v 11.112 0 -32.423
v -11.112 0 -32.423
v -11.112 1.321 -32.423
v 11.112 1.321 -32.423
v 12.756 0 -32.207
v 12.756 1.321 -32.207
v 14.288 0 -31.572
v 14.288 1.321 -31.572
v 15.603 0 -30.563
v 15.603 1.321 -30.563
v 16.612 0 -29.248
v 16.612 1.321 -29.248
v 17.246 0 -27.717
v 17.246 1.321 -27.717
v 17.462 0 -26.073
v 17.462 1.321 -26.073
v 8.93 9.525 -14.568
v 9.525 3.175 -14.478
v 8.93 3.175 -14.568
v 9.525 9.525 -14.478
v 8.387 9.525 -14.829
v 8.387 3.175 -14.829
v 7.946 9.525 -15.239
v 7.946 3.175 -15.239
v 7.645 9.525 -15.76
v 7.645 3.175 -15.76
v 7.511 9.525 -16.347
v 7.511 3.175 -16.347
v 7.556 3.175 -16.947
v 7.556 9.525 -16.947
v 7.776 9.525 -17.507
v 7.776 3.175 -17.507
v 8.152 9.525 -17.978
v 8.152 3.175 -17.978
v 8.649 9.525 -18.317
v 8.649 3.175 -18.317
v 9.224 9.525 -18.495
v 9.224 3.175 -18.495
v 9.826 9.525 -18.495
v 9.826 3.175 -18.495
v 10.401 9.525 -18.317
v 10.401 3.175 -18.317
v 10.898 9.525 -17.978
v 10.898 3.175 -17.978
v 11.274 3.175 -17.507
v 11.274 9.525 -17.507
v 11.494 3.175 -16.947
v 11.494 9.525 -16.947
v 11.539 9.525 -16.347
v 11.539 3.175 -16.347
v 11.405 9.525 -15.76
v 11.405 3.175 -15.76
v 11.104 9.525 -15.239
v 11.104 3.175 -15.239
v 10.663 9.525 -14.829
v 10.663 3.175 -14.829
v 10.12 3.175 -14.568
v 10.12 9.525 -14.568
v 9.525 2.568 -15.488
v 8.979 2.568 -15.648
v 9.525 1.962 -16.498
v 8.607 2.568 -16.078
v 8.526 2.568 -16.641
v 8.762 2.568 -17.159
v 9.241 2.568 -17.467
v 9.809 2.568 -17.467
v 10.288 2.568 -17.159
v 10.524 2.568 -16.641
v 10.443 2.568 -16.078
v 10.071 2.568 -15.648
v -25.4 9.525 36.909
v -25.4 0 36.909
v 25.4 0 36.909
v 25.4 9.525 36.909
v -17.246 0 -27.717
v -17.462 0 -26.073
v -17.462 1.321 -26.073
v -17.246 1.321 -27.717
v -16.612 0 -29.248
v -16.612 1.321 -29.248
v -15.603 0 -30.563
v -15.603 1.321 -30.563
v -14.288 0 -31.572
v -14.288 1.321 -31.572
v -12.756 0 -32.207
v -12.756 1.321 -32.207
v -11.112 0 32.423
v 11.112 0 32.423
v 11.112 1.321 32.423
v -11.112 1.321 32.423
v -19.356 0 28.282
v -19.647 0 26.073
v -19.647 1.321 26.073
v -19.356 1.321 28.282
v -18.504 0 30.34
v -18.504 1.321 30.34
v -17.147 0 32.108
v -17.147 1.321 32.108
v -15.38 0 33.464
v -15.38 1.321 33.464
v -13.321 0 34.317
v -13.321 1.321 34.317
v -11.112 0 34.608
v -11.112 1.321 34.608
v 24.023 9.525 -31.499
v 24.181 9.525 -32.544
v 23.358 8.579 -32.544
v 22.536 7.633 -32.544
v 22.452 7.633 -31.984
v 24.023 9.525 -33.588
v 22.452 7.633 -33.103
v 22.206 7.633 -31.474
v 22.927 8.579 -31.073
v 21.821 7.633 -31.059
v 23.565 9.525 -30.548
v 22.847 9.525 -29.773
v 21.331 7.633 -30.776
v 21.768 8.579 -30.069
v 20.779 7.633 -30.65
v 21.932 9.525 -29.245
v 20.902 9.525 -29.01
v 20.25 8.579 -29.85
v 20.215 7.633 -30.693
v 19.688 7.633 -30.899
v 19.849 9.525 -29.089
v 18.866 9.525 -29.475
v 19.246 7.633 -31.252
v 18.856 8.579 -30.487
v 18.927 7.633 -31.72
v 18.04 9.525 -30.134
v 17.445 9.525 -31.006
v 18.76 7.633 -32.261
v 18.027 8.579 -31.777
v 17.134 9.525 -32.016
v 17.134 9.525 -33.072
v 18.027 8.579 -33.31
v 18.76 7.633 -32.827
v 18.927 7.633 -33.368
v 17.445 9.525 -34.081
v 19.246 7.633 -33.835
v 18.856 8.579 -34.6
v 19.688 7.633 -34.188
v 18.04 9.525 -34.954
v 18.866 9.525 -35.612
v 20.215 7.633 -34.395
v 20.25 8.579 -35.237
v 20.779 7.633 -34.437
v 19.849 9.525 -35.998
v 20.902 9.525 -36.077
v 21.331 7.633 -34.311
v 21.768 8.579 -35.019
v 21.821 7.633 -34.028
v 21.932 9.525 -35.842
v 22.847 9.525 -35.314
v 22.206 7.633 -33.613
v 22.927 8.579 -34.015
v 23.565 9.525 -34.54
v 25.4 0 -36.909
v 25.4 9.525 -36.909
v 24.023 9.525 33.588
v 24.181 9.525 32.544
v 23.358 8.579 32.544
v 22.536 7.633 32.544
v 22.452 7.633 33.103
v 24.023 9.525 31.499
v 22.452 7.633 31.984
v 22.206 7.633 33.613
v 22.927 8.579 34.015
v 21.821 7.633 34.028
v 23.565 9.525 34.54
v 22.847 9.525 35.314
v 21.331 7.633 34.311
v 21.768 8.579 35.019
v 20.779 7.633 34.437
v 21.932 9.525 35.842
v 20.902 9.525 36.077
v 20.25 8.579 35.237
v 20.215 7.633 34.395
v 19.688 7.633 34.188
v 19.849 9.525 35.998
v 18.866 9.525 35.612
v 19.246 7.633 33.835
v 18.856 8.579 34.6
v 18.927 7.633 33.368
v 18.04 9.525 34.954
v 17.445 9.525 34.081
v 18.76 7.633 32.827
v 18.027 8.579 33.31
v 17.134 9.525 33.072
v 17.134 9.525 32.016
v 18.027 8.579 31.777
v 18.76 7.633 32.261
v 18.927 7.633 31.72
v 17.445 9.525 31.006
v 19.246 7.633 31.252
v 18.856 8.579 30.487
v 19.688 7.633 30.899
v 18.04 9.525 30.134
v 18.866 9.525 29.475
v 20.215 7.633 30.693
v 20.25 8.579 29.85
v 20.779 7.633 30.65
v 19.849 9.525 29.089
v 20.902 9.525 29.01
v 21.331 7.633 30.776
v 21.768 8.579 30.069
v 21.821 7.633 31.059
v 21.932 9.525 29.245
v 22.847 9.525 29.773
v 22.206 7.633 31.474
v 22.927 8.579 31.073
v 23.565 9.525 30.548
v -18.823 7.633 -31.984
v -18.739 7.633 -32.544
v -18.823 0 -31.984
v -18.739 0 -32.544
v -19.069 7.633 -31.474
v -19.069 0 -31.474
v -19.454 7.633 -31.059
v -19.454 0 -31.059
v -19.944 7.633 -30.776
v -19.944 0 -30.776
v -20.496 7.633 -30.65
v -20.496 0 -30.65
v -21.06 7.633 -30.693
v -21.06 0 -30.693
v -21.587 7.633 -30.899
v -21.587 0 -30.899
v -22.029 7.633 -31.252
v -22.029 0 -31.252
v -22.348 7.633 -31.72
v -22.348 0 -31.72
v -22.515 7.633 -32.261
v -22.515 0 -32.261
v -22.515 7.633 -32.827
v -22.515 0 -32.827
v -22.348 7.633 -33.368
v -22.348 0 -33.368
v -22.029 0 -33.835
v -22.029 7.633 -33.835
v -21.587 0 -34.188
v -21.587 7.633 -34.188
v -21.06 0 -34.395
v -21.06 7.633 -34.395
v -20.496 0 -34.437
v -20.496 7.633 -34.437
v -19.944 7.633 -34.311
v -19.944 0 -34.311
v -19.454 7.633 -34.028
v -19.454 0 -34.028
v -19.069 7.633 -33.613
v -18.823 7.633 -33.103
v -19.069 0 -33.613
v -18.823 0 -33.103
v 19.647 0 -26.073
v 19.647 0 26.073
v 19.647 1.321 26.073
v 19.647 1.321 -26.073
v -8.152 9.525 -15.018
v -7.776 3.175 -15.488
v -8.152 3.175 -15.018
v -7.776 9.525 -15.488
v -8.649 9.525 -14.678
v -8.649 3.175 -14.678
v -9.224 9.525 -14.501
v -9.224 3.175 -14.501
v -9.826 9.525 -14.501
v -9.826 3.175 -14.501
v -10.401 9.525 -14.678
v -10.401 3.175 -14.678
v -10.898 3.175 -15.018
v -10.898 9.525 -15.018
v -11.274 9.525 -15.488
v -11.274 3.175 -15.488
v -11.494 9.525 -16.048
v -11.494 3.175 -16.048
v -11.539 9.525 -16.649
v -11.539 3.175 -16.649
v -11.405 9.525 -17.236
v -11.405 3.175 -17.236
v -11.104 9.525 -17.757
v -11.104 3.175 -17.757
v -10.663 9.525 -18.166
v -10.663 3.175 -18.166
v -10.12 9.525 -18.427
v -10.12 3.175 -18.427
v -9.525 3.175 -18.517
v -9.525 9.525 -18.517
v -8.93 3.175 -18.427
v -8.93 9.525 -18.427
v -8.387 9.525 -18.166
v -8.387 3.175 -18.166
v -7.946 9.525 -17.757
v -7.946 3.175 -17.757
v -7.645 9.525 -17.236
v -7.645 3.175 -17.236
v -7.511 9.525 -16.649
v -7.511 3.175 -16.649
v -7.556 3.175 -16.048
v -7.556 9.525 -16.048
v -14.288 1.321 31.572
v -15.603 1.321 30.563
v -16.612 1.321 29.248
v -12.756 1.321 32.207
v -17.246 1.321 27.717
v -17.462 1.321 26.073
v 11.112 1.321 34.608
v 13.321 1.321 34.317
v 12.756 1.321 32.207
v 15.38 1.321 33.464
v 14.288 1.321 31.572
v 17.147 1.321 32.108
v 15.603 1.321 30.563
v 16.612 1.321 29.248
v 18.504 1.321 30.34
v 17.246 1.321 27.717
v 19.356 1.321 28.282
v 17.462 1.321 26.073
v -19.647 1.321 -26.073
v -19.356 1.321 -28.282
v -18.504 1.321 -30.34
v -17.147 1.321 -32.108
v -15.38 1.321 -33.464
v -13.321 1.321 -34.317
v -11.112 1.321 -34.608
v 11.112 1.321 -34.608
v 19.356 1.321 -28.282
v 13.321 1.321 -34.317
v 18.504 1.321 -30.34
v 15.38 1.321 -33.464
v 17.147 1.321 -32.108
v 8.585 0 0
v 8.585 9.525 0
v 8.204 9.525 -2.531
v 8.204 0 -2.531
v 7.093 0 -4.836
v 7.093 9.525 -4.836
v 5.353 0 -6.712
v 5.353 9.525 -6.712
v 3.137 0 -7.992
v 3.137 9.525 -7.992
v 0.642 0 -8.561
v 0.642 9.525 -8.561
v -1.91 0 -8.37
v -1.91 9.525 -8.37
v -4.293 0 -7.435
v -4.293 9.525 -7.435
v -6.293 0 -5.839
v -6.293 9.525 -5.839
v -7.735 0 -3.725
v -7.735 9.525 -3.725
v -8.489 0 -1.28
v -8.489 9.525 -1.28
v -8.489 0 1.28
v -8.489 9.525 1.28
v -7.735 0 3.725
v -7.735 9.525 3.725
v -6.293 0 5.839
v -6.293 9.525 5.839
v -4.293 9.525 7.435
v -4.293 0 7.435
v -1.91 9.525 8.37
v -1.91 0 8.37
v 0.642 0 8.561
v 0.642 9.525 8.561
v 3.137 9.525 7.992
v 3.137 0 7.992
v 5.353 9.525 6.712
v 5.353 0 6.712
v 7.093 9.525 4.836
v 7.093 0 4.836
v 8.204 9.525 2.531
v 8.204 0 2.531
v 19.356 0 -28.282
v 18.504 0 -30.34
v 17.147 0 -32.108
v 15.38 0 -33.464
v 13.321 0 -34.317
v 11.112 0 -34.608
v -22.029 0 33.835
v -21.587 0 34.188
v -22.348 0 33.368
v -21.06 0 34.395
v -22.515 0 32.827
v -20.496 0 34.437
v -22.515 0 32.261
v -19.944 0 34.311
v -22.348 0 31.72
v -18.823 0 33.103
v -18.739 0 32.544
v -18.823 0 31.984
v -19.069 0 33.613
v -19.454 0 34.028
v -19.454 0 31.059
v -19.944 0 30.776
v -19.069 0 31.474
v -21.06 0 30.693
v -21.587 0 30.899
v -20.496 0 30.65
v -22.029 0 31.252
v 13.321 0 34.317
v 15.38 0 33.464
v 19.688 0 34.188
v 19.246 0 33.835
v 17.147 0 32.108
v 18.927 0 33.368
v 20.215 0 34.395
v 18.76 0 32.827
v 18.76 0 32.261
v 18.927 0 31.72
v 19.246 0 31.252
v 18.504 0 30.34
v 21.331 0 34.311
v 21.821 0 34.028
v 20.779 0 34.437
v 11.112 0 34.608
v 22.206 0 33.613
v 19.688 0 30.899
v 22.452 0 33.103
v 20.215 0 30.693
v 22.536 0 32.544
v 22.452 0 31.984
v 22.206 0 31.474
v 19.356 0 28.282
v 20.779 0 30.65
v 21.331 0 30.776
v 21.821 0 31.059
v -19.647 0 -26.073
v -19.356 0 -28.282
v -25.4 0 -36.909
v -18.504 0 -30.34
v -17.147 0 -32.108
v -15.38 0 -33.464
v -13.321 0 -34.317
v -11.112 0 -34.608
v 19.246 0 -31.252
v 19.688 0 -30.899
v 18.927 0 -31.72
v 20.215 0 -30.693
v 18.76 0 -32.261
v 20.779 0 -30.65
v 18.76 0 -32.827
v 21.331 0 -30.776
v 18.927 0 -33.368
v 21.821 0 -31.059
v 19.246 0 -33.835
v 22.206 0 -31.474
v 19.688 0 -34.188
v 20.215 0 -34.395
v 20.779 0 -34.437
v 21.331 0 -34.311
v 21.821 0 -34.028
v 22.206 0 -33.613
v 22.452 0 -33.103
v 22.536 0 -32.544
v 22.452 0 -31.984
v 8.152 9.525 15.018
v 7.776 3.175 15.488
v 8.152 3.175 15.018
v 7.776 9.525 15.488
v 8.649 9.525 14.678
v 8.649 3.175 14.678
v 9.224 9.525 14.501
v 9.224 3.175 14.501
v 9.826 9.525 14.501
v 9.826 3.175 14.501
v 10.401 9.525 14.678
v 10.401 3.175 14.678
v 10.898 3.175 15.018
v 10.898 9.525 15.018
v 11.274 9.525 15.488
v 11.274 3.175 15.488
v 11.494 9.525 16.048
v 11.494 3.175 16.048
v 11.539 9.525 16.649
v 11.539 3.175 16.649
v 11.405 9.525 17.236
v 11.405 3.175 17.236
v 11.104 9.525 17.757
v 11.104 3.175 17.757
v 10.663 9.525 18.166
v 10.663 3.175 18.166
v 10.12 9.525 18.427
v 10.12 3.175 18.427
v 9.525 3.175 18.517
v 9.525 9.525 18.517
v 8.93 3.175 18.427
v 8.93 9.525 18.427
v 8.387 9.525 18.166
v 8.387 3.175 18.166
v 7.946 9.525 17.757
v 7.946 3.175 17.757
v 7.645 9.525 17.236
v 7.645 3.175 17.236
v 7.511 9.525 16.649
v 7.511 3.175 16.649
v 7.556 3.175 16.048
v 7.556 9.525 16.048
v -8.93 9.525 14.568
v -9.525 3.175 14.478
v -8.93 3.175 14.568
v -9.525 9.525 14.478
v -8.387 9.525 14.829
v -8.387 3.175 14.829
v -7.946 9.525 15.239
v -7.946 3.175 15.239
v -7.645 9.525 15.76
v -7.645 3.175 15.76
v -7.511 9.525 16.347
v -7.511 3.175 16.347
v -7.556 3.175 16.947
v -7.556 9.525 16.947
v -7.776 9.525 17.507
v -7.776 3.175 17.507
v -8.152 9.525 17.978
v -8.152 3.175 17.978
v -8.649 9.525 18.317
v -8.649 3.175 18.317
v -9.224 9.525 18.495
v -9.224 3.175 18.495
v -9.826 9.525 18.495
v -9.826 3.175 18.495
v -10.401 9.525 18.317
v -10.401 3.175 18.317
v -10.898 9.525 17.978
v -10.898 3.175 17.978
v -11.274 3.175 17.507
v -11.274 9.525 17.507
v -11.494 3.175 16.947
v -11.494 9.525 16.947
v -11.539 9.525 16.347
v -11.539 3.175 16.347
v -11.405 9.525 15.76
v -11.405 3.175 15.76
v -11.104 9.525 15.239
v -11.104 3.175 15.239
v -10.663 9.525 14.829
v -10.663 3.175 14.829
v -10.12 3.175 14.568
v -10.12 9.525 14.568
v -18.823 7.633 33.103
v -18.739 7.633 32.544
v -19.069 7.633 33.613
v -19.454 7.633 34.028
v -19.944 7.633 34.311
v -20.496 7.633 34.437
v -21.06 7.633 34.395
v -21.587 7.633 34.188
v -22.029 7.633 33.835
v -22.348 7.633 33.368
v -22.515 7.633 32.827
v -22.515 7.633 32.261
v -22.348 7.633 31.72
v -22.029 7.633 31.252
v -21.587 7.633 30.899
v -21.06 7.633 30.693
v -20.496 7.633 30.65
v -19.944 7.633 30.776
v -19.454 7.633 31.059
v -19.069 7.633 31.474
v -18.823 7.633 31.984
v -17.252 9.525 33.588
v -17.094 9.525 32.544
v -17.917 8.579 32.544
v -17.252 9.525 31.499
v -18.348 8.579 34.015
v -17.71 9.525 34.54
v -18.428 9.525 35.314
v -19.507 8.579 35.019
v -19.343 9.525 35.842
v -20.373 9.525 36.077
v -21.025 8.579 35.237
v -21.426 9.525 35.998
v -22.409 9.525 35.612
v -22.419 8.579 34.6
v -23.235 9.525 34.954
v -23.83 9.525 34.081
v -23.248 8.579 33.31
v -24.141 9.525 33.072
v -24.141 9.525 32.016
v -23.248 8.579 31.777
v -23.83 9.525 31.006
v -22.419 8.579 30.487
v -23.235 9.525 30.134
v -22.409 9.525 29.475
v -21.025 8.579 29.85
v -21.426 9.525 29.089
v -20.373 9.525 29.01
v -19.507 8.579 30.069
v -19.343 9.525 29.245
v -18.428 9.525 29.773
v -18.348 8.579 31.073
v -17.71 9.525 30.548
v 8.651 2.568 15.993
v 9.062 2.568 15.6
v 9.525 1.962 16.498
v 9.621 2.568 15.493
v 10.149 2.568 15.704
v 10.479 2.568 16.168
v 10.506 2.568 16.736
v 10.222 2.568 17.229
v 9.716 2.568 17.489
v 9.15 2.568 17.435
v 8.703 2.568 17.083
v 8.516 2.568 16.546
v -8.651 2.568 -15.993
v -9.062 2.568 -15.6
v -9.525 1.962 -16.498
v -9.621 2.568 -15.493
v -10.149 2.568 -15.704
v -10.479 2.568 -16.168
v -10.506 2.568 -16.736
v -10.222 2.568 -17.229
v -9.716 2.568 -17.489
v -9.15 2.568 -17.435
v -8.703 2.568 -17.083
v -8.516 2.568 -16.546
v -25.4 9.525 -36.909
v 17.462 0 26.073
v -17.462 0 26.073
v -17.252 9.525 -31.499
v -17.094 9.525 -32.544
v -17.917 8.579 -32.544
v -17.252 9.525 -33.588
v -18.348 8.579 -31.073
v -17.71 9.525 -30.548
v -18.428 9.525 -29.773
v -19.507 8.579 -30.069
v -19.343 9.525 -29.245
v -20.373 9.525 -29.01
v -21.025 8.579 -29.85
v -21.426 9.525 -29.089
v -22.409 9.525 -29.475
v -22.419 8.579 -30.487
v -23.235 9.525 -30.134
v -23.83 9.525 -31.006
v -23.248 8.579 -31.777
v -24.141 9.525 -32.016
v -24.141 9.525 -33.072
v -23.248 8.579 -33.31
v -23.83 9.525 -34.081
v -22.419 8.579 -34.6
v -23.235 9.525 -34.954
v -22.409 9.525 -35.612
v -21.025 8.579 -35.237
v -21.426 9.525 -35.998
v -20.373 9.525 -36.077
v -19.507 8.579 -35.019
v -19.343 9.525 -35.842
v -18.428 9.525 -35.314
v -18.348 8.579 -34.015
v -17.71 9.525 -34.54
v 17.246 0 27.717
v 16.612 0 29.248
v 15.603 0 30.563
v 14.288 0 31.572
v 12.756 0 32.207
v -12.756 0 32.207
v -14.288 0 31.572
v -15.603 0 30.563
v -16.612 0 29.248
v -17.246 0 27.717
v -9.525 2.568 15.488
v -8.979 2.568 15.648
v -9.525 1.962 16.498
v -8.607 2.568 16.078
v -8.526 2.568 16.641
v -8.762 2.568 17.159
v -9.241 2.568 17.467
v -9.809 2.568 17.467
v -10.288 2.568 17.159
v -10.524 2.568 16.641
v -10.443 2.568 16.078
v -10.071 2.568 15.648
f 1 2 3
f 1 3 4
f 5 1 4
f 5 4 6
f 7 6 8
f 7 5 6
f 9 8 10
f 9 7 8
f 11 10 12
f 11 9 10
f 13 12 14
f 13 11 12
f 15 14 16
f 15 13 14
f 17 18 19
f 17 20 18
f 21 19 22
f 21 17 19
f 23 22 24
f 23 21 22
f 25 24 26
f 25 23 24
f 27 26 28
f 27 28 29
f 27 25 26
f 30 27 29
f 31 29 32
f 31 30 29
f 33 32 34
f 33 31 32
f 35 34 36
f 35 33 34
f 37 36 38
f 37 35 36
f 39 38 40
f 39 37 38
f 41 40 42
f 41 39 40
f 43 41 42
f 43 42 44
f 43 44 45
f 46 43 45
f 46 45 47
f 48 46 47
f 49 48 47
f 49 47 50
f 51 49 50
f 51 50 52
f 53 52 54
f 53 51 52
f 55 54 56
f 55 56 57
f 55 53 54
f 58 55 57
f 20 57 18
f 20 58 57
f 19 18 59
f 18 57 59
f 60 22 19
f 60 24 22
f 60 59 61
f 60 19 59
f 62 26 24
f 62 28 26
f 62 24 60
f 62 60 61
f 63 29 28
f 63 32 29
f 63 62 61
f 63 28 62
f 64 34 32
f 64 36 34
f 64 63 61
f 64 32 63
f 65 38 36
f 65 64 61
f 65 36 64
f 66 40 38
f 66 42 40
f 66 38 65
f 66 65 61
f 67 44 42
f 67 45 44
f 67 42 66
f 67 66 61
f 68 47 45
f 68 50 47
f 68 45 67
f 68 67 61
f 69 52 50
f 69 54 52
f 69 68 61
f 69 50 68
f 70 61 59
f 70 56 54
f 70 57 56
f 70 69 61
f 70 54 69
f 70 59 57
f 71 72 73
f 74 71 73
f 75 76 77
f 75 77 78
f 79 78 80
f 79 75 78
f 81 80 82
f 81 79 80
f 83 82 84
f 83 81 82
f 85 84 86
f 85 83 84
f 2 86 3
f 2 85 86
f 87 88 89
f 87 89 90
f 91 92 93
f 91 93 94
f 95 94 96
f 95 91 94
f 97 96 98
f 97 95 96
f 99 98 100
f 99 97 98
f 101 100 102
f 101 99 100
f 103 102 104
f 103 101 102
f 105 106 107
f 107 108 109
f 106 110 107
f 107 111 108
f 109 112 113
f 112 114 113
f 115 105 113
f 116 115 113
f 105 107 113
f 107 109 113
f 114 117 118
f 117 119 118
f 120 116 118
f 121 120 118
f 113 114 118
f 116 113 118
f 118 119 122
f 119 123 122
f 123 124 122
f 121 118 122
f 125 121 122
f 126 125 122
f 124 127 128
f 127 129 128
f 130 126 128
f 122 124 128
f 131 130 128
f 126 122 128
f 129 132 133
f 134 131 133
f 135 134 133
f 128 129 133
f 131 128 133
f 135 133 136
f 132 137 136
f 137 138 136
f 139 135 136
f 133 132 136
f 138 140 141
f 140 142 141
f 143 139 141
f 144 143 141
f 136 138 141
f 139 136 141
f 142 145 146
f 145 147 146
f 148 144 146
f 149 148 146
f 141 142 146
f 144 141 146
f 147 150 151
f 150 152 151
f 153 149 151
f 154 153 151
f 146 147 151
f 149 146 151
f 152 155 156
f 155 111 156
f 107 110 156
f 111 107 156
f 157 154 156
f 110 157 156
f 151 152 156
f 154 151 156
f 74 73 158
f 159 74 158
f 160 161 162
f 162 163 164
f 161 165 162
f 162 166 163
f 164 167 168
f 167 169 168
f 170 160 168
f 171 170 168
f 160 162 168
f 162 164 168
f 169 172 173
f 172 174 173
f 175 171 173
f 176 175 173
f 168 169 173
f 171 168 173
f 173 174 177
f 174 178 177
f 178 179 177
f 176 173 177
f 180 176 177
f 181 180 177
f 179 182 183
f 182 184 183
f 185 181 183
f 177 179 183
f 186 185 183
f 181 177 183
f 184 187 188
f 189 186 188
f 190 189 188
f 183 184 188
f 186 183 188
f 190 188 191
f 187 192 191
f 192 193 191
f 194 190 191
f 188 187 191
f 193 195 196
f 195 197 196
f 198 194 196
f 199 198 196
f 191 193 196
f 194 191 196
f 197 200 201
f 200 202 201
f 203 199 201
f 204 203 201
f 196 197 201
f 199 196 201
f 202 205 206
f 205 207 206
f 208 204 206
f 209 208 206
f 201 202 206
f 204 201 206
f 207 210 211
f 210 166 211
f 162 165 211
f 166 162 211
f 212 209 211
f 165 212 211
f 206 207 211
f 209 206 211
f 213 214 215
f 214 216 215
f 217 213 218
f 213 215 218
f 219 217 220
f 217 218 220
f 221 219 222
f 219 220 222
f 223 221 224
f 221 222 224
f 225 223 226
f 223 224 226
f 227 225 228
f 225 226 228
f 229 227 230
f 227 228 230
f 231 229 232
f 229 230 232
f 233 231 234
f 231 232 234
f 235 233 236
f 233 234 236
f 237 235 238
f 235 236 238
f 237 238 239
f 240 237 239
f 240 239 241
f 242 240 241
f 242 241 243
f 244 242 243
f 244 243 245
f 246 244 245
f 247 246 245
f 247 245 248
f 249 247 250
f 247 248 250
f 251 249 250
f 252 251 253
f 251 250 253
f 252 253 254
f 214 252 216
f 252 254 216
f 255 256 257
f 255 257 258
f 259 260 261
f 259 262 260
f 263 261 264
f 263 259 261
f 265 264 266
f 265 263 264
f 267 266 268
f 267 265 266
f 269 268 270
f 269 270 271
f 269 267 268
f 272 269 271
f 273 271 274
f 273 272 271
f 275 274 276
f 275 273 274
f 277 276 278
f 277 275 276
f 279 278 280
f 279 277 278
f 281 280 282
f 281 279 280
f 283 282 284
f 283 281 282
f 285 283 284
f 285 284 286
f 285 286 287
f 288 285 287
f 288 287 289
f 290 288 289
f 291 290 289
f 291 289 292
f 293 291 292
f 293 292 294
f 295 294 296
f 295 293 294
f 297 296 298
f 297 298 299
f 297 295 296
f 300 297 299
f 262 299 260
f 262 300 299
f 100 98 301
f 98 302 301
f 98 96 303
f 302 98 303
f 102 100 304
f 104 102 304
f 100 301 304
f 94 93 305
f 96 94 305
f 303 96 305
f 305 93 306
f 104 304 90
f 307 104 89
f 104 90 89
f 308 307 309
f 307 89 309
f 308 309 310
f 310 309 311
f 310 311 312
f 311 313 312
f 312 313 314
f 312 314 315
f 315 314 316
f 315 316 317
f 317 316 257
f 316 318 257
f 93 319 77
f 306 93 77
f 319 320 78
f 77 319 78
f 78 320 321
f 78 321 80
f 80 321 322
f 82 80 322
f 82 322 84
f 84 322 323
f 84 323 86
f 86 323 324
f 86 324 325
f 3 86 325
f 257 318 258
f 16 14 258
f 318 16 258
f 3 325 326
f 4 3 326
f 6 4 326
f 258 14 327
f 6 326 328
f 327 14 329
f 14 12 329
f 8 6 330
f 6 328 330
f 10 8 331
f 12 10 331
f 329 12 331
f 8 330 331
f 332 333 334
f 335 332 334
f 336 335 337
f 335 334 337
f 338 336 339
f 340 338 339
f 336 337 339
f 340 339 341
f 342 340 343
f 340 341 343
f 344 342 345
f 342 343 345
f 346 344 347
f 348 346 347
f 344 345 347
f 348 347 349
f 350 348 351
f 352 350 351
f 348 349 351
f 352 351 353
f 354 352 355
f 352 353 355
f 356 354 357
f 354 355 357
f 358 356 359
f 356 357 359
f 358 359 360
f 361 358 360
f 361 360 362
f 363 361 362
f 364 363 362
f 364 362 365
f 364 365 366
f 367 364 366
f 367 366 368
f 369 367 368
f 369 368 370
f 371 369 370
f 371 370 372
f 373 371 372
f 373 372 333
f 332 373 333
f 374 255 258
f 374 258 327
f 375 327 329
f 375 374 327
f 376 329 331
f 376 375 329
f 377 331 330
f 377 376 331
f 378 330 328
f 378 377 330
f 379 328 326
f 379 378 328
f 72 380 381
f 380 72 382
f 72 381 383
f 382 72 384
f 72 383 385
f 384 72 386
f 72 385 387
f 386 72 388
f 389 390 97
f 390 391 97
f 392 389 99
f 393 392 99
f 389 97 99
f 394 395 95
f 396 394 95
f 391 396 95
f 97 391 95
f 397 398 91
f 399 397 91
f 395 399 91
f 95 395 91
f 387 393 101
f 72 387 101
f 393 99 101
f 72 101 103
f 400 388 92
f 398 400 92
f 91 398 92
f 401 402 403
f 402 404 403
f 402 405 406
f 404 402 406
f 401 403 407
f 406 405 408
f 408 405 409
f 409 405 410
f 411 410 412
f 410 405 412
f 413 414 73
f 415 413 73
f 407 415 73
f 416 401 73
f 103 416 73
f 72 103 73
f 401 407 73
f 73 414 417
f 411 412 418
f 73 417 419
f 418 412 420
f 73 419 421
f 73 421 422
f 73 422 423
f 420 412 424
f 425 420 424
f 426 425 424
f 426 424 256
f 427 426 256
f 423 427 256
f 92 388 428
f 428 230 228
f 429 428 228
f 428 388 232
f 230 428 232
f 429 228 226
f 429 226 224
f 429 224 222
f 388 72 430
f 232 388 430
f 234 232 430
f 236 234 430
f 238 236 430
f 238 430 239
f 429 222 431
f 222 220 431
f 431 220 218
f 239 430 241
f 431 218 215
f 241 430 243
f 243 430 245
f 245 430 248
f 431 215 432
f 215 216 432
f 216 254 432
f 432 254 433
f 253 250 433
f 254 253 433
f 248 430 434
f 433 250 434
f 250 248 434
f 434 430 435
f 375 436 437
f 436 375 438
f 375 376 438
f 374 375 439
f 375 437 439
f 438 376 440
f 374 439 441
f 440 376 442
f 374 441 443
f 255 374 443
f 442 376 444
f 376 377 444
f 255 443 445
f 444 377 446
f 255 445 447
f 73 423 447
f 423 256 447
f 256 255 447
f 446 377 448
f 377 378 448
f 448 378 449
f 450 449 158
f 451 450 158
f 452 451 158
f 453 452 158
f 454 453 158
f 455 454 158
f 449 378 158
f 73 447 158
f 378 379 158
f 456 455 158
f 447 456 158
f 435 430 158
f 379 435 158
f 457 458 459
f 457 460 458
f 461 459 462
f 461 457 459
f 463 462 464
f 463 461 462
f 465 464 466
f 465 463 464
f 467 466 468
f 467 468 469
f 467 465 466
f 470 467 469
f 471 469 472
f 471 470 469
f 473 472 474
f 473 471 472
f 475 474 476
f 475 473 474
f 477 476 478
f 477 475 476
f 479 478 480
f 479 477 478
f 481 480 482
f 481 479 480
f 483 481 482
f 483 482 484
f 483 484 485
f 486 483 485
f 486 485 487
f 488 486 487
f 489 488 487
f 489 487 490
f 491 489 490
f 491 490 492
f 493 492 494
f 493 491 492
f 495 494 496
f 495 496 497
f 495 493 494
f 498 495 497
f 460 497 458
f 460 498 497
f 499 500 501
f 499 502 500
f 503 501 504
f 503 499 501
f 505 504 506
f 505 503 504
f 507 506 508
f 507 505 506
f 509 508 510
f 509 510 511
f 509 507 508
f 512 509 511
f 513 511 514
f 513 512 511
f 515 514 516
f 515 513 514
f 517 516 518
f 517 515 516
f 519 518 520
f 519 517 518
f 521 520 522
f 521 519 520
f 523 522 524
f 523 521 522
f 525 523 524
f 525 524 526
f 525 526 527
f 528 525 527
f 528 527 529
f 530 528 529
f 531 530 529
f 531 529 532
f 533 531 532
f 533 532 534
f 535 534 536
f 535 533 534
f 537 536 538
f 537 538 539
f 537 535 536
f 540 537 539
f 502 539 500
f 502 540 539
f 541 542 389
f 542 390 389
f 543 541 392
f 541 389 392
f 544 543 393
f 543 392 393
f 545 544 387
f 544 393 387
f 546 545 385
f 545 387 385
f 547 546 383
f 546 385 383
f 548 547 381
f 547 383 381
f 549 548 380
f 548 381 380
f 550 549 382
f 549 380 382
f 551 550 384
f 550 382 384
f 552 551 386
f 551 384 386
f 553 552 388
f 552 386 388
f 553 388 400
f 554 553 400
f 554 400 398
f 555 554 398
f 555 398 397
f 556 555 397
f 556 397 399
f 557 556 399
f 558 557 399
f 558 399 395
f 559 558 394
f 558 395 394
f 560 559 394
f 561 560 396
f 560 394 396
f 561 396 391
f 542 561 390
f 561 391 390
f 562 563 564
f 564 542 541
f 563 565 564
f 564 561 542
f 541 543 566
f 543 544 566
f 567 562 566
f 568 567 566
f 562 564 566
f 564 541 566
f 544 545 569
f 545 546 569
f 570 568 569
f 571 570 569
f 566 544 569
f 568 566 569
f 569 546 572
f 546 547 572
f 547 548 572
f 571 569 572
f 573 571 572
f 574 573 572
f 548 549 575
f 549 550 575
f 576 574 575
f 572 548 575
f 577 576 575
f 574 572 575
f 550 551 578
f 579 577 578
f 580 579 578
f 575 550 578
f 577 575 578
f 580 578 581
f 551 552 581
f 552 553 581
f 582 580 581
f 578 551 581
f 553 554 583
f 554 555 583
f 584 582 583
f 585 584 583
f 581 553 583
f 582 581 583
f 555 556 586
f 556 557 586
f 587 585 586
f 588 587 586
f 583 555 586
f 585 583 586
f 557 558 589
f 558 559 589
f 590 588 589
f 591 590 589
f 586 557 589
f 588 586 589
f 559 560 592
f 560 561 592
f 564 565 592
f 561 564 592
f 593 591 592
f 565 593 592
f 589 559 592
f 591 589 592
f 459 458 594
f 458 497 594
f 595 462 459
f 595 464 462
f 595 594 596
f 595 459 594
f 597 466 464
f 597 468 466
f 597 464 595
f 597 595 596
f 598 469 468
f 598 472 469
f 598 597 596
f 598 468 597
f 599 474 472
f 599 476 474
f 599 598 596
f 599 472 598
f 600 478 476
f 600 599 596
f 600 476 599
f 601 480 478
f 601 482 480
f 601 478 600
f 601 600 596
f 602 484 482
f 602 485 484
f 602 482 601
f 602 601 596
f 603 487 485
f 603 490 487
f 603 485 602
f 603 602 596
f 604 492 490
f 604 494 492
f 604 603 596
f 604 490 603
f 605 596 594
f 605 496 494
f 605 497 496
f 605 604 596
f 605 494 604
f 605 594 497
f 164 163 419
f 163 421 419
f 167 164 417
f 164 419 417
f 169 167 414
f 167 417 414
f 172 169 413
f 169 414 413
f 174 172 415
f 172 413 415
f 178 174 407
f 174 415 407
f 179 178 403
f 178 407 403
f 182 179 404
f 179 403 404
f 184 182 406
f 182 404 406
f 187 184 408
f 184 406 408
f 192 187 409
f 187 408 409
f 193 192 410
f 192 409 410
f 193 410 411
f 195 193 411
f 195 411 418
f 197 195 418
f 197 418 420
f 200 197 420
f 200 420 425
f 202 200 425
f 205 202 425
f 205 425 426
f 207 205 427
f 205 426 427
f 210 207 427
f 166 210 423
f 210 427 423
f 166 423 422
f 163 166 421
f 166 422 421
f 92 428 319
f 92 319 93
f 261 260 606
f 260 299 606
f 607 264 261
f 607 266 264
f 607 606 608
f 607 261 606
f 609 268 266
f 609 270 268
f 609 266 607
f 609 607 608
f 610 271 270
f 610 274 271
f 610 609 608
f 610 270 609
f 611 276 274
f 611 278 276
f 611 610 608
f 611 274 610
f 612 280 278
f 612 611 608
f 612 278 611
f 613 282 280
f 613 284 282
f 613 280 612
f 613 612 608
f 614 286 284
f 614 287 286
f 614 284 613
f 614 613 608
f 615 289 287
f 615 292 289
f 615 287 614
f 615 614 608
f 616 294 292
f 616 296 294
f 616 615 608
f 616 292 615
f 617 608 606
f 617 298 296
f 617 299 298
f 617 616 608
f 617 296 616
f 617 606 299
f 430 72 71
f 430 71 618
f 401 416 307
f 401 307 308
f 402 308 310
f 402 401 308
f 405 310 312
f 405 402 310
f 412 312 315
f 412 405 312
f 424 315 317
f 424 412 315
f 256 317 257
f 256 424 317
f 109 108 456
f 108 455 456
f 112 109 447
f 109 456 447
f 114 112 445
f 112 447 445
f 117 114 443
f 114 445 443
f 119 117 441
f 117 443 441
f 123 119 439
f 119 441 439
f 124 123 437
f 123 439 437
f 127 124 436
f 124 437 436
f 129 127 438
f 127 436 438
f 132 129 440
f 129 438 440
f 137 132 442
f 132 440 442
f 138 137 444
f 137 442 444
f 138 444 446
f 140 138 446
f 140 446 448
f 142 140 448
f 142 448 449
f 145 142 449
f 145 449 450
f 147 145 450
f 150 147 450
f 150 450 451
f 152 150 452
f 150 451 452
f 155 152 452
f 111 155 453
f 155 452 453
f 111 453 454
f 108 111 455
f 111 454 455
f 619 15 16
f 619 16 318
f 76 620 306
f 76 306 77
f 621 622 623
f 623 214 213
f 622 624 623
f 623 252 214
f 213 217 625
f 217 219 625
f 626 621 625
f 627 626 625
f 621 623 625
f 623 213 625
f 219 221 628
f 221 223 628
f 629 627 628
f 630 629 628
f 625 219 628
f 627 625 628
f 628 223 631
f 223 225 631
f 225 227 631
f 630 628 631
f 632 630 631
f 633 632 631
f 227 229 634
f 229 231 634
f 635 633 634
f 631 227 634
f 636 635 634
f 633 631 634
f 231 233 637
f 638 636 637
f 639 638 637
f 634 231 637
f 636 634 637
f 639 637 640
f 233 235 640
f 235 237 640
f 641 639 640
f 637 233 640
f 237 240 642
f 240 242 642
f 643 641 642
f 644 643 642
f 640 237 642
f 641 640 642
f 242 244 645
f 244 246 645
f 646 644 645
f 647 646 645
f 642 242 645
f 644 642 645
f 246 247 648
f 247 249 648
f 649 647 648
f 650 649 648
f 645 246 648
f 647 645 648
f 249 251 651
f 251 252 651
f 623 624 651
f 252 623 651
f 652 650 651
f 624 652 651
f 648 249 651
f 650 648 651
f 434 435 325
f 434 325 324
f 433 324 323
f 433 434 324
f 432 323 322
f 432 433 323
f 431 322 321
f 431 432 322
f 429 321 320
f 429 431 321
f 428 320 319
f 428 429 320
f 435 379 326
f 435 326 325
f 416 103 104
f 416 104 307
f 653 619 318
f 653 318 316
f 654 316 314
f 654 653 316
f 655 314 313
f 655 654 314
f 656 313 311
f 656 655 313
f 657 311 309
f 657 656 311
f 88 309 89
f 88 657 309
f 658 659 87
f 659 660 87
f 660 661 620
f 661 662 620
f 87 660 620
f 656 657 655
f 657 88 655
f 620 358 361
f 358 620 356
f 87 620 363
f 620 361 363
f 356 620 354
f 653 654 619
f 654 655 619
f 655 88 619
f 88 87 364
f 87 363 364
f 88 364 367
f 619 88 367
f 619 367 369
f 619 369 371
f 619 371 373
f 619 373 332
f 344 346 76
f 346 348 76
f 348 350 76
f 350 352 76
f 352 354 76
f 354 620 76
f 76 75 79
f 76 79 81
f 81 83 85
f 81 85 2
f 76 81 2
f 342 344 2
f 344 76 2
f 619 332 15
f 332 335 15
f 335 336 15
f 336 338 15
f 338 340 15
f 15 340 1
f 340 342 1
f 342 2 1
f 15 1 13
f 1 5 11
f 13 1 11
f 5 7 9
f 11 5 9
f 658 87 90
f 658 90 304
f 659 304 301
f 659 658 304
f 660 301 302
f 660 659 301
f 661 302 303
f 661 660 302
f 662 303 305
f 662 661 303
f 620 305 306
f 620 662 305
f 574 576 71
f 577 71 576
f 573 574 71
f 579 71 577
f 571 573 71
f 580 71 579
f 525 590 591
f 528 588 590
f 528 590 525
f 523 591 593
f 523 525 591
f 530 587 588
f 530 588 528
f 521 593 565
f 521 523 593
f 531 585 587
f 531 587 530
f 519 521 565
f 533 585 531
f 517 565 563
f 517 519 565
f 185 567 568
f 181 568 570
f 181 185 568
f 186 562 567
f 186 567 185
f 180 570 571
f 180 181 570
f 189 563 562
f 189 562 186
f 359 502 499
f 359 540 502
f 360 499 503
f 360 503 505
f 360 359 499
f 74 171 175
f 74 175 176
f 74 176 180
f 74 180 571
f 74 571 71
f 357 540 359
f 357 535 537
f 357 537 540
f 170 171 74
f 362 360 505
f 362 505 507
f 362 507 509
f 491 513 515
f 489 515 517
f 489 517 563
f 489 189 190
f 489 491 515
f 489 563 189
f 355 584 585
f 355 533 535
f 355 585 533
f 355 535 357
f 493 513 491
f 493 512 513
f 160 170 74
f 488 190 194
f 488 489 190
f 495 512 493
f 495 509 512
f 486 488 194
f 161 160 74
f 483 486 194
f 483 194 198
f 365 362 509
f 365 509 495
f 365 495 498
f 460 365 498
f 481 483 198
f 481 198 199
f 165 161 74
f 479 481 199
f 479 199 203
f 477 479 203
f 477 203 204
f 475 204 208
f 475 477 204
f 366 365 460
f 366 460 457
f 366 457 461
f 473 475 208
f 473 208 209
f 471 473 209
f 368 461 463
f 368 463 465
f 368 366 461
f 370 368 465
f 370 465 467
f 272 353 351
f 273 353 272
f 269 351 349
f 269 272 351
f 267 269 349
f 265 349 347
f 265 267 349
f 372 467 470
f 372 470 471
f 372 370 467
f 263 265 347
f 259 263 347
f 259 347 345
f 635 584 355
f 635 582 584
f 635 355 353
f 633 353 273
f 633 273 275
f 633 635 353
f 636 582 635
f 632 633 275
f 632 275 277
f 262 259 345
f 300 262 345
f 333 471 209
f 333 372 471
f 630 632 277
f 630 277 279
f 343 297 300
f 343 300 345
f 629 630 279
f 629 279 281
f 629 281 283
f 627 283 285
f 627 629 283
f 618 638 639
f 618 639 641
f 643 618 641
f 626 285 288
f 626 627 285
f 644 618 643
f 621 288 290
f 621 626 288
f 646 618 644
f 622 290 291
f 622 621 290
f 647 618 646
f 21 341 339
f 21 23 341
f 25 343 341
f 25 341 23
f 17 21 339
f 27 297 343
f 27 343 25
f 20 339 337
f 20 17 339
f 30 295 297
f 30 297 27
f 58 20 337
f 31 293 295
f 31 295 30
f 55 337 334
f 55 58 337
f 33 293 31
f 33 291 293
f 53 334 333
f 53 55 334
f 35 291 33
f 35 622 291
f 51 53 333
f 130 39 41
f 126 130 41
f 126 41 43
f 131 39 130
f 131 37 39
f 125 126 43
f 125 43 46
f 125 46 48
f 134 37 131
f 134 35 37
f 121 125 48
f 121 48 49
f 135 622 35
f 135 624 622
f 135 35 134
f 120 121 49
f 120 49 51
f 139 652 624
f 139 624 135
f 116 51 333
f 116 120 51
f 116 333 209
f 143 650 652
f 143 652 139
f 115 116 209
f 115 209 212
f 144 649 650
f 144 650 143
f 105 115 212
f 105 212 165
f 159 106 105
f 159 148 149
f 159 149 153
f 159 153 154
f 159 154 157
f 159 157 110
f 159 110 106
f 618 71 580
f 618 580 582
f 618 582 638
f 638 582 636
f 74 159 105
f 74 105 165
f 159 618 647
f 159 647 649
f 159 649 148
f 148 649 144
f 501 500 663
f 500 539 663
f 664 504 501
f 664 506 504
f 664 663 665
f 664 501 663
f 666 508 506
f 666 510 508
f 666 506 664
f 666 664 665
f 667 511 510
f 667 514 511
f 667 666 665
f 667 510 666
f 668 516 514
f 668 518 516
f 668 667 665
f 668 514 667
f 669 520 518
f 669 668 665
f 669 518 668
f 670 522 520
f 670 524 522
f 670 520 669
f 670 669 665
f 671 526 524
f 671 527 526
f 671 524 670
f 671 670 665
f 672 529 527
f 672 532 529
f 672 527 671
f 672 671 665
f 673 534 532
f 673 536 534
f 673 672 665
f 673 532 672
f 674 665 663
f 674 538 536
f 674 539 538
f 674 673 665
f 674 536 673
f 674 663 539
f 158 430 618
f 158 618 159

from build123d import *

# Parameters (mm, degrees)
SKETCH1_W                                      = 50.8
SKETCH1_H                                      = 73.81875
BOSS_EXTRUDE1_DEPTH                            = 9.525
CSK_FOR_6_FLAT_HEAD_MACHINE_SCREW1_D           = 3.7973
CSK_FOR_6_FLAT_HEAD_MACHINE_SCREW1_CSINK_D     = 7.0866
CSK_FOR_6_FLAT_HEAD_MACHINE_SCREW1_CSINK_ANGLE = 82
CUT_EXTRUDE1_DASH_036_DEPTH                    = 1.3208
SKETCH5_R                                      = 8.5852
CUT_EXTRUDE1_DEPTH                             = 10.525
CIRPATTERN1_COUNT                              = 6


with BuildPart() as part:
    # Sketch1 → Boss-Extrude1 (new body)
    with BuildSketch(Plane(origin=(0, 0, 0), x_dir=(1, 0, 0), z_dir=(0, 1, 0))):
        Rectangle(SKETCH1_W, SKETCH1_H)
    extrude(amount=BOSS_EXTRUDE1_DEPTH)

    # CSK for #6 Flat Head Machine Screw1 (through all)
    with Locations(Plane(origin=(0, 9.525, 0), x_dir=(-1, 0, 0), z_dir=(0, 1, 0))):
        with Locations((20.6375, -32.54375), (-20.6375, -32.54375), (-20.6375, 32.54375), (20.6375, 32.54375)):
            CounterSinkHole(CSK_FOR_6_FLAT_HEAD_MACHINE_SCREW1_D / 2, CSK_FOR_6_FLAT_HEAD_MACHINE_SCREW1_CSINK_D / 2, counter_sink_angle=CSK_FOR_6_FLAT_HEAD_MACHINE_SCREW1_CSINK_ANGLE)

    # Sketch4 → Cut-Extrude1 - dash 036 (cut)
    with BuildSketch(Plane(origin=(0, 0, 0), x_dir=(-1, 0, 0), z_dir=(0, -1, 0))):
        with BuildLine():
            Line((-11.1125, 34.6075), (11.1125, 34.6075))
            ThreePointArc((11.1125, 34.6075), (17.147232113, 32.107832113), (19.6469, 26.0731))
            Line((19.6469, 26.0731), (19.6469, -26.0731))
            ThreePointArc((19.6469, -26.0731), (17.147232113, -32.107832113), (11.1125, -34.6075))
            Line((11.1125, -34.6075), (-11.1125, -34.6075))
            ThreePointArc((-11.1125, -34.6075), (-17.147232113, -32.107832113), (-19.6469, -26.0731))
            Line((-19.6469, -26.0731), (-19.6469, 26.0731))
            ThreePointArc((-19.6469, 26.0731), (-17.147232113, 32.107832113), (-11.1125, 34.6075))
        make_face()
        with BuildLine():
            Line((-11.1125, -32.4231), (11.1125, -32.4231))
            ThreePointArc((11.1125, -32.4231), (15.602628061, -30.563228061), (17.4625, -26.0731))
            Line((17.4625, -26.0731), (17.4625, 26.0731))
            ThreePointArc((17.4625, 26.0731), (15.602628061, 30.563228061), (11.1125, 32.4231))
            Line((11.1125, 32.4231), (-11.1125, 32.4231))
            ThreePointArc((-11.1125, 32.4231), (-15.602628061, 30.563228061), (-17.4625, 26.0731))
            Line((-17.4625, 26.0731), (-17.4625, -26.0731))
            ThreePointArc((-17.4625, -26.0731), (-15.602628061, -30.563228061), (-11.1125, -32.4231))
        make_face(mode=Mode.SUBTRACT)
    extrude(amount=-CUT_EXTRUDE1_DASH_036_DEPTH, mode=Mode.SUBTRACT)

    # Sketch5 → Cut-Extrude1 (cut, through all)
    with BuildSketch(Plane(origin=(0, 9.525, 0), x_dir=(1, 0, 0), z_dir=(0, 1, 0))):
        Circle(SKETCH5_R)
    extrude(amount=-CUT_EXTRUDE1_DEPTH, mode=Mode.SUBTRACT)

    # Sketch9 → #10-32 Tapped Hole2 (revolve, cut)
    with BuildSketch(Plane(origin=(9.525, 9.525, -16.497783942), x_dir=(0, 0, 1), z_dir=(1, 0, 0))):
        Polygon((0, 0), (0, 7.563317848), (2.0193, 6.35), (2.0193, 0), align=None)
    f_10_32_tapped_hole2 = revolve(axis=Axis((9.525, 15.875, -16.497783942), (0, -1, 0)), mode=Mode.SUBTRACT)

    # CirPattern1: #10-32 Tapped Hole2 ×6 about axis, 2 skipped
    cirpattern1_axis = Axis((0, 0, 0), (0, 1, 0))
    add([f_10_32_tapped_hole2.rotate(cirpattern1_axis, i * 360 / CIRPATTERN1_COUNT) for i in range(1, CIRPATTERN1_COUNT) if i not in (2, 5)], mode=Mode.SUBTRACT)


solid = part.part
